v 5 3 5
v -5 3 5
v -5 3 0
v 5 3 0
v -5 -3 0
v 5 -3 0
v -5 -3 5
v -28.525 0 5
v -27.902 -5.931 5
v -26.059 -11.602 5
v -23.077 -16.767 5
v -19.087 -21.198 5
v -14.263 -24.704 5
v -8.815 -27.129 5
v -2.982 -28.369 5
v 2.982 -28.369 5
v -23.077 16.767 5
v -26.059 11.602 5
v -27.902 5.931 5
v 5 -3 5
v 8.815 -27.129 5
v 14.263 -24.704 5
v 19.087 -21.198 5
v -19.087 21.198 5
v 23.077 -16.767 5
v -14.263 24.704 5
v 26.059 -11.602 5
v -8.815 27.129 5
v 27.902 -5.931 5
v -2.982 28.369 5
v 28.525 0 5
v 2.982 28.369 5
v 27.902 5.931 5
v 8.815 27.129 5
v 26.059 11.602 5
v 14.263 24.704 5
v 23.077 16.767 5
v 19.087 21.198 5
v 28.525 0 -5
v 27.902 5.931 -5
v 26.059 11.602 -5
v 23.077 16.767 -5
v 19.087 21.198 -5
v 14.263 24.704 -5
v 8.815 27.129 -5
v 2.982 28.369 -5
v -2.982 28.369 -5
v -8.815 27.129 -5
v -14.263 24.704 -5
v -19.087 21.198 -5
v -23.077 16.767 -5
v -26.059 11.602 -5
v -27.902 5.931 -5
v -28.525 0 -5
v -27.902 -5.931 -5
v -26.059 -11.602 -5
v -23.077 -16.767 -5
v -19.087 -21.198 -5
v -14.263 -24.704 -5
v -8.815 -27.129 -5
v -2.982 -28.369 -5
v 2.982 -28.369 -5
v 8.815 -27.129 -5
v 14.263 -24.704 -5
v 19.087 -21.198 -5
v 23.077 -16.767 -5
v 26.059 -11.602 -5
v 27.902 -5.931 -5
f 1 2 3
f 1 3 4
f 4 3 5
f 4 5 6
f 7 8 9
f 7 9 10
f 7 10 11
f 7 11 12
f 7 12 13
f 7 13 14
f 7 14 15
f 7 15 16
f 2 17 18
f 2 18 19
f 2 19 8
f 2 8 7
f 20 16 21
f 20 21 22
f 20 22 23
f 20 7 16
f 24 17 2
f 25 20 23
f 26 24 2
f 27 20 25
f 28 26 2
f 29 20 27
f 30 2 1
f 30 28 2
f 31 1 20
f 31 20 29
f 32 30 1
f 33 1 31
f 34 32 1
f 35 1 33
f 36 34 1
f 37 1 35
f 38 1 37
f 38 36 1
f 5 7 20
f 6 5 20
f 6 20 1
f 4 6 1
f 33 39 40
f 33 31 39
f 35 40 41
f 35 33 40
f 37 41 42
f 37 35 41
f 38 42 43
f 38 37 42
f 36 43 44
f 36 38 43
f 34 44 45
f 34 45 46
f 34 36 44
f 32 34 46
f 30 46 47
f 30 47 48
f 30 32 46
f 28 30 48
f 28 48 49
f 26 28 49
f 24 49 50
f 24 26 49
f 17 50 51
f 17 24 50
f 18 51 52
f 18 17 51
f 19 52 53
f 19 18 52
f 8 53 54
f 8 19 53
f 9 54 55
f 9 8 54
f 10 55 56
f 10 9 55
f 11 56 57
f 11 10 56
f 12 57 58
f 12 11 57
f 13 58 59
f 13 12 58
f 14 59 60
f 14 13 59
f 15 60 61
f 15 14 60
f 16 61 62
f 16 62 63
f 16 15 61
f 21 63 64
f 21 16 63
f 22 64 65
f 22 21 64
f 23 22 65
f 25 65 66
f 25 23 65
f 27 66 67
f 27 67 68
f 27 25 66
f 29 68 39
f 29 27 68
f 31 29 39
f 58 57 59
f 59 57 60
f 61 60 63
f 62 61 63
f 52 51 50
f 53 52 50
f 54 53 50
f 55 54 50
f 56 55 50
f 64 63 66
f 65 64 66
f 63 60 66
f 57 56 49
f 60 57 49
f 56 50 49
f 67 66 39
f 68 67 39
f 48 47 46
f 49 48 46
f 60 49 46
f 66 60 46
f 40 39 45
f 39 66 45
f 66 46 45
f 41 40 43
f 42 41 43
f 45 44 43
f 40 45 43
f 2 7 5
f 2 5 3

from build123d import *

# Parameters (mm, degrees)
SCHIZZO1_R                   = 28.525234369
ESTRUSIONE_ESTRUSIONE2_DEPTH = 5
SCHIZZO4_W                   = 10
SCHIZZO4_H                   = 6
TAGLIO_ESTRUSIONE1_DEPTH     = 5


with BuildPart() as part:
    # Schizzo1 → Estrusione-Estrusione2 (new, symmetric)
    with BuildSketch(Plane.XY):
        Circle(SCHIZZO1_R)
    extrude(amount=ESTRUSIONE_ESTRUSIONE2_DEPTH, both=True)

    # Schizzo4 → Taglio-Estrusione1 (cut, symmetric)
    with BuildSketch(Plane.XY.offset(5)):
        Rectangle(SCHIZZO4_W, SCHIZZO4_H)
    extrude(amount=TAGLIO_ESTRUSIONE1_DEPTH, both=True, mode=Mode.SUBTRACT)


solid = part.part
